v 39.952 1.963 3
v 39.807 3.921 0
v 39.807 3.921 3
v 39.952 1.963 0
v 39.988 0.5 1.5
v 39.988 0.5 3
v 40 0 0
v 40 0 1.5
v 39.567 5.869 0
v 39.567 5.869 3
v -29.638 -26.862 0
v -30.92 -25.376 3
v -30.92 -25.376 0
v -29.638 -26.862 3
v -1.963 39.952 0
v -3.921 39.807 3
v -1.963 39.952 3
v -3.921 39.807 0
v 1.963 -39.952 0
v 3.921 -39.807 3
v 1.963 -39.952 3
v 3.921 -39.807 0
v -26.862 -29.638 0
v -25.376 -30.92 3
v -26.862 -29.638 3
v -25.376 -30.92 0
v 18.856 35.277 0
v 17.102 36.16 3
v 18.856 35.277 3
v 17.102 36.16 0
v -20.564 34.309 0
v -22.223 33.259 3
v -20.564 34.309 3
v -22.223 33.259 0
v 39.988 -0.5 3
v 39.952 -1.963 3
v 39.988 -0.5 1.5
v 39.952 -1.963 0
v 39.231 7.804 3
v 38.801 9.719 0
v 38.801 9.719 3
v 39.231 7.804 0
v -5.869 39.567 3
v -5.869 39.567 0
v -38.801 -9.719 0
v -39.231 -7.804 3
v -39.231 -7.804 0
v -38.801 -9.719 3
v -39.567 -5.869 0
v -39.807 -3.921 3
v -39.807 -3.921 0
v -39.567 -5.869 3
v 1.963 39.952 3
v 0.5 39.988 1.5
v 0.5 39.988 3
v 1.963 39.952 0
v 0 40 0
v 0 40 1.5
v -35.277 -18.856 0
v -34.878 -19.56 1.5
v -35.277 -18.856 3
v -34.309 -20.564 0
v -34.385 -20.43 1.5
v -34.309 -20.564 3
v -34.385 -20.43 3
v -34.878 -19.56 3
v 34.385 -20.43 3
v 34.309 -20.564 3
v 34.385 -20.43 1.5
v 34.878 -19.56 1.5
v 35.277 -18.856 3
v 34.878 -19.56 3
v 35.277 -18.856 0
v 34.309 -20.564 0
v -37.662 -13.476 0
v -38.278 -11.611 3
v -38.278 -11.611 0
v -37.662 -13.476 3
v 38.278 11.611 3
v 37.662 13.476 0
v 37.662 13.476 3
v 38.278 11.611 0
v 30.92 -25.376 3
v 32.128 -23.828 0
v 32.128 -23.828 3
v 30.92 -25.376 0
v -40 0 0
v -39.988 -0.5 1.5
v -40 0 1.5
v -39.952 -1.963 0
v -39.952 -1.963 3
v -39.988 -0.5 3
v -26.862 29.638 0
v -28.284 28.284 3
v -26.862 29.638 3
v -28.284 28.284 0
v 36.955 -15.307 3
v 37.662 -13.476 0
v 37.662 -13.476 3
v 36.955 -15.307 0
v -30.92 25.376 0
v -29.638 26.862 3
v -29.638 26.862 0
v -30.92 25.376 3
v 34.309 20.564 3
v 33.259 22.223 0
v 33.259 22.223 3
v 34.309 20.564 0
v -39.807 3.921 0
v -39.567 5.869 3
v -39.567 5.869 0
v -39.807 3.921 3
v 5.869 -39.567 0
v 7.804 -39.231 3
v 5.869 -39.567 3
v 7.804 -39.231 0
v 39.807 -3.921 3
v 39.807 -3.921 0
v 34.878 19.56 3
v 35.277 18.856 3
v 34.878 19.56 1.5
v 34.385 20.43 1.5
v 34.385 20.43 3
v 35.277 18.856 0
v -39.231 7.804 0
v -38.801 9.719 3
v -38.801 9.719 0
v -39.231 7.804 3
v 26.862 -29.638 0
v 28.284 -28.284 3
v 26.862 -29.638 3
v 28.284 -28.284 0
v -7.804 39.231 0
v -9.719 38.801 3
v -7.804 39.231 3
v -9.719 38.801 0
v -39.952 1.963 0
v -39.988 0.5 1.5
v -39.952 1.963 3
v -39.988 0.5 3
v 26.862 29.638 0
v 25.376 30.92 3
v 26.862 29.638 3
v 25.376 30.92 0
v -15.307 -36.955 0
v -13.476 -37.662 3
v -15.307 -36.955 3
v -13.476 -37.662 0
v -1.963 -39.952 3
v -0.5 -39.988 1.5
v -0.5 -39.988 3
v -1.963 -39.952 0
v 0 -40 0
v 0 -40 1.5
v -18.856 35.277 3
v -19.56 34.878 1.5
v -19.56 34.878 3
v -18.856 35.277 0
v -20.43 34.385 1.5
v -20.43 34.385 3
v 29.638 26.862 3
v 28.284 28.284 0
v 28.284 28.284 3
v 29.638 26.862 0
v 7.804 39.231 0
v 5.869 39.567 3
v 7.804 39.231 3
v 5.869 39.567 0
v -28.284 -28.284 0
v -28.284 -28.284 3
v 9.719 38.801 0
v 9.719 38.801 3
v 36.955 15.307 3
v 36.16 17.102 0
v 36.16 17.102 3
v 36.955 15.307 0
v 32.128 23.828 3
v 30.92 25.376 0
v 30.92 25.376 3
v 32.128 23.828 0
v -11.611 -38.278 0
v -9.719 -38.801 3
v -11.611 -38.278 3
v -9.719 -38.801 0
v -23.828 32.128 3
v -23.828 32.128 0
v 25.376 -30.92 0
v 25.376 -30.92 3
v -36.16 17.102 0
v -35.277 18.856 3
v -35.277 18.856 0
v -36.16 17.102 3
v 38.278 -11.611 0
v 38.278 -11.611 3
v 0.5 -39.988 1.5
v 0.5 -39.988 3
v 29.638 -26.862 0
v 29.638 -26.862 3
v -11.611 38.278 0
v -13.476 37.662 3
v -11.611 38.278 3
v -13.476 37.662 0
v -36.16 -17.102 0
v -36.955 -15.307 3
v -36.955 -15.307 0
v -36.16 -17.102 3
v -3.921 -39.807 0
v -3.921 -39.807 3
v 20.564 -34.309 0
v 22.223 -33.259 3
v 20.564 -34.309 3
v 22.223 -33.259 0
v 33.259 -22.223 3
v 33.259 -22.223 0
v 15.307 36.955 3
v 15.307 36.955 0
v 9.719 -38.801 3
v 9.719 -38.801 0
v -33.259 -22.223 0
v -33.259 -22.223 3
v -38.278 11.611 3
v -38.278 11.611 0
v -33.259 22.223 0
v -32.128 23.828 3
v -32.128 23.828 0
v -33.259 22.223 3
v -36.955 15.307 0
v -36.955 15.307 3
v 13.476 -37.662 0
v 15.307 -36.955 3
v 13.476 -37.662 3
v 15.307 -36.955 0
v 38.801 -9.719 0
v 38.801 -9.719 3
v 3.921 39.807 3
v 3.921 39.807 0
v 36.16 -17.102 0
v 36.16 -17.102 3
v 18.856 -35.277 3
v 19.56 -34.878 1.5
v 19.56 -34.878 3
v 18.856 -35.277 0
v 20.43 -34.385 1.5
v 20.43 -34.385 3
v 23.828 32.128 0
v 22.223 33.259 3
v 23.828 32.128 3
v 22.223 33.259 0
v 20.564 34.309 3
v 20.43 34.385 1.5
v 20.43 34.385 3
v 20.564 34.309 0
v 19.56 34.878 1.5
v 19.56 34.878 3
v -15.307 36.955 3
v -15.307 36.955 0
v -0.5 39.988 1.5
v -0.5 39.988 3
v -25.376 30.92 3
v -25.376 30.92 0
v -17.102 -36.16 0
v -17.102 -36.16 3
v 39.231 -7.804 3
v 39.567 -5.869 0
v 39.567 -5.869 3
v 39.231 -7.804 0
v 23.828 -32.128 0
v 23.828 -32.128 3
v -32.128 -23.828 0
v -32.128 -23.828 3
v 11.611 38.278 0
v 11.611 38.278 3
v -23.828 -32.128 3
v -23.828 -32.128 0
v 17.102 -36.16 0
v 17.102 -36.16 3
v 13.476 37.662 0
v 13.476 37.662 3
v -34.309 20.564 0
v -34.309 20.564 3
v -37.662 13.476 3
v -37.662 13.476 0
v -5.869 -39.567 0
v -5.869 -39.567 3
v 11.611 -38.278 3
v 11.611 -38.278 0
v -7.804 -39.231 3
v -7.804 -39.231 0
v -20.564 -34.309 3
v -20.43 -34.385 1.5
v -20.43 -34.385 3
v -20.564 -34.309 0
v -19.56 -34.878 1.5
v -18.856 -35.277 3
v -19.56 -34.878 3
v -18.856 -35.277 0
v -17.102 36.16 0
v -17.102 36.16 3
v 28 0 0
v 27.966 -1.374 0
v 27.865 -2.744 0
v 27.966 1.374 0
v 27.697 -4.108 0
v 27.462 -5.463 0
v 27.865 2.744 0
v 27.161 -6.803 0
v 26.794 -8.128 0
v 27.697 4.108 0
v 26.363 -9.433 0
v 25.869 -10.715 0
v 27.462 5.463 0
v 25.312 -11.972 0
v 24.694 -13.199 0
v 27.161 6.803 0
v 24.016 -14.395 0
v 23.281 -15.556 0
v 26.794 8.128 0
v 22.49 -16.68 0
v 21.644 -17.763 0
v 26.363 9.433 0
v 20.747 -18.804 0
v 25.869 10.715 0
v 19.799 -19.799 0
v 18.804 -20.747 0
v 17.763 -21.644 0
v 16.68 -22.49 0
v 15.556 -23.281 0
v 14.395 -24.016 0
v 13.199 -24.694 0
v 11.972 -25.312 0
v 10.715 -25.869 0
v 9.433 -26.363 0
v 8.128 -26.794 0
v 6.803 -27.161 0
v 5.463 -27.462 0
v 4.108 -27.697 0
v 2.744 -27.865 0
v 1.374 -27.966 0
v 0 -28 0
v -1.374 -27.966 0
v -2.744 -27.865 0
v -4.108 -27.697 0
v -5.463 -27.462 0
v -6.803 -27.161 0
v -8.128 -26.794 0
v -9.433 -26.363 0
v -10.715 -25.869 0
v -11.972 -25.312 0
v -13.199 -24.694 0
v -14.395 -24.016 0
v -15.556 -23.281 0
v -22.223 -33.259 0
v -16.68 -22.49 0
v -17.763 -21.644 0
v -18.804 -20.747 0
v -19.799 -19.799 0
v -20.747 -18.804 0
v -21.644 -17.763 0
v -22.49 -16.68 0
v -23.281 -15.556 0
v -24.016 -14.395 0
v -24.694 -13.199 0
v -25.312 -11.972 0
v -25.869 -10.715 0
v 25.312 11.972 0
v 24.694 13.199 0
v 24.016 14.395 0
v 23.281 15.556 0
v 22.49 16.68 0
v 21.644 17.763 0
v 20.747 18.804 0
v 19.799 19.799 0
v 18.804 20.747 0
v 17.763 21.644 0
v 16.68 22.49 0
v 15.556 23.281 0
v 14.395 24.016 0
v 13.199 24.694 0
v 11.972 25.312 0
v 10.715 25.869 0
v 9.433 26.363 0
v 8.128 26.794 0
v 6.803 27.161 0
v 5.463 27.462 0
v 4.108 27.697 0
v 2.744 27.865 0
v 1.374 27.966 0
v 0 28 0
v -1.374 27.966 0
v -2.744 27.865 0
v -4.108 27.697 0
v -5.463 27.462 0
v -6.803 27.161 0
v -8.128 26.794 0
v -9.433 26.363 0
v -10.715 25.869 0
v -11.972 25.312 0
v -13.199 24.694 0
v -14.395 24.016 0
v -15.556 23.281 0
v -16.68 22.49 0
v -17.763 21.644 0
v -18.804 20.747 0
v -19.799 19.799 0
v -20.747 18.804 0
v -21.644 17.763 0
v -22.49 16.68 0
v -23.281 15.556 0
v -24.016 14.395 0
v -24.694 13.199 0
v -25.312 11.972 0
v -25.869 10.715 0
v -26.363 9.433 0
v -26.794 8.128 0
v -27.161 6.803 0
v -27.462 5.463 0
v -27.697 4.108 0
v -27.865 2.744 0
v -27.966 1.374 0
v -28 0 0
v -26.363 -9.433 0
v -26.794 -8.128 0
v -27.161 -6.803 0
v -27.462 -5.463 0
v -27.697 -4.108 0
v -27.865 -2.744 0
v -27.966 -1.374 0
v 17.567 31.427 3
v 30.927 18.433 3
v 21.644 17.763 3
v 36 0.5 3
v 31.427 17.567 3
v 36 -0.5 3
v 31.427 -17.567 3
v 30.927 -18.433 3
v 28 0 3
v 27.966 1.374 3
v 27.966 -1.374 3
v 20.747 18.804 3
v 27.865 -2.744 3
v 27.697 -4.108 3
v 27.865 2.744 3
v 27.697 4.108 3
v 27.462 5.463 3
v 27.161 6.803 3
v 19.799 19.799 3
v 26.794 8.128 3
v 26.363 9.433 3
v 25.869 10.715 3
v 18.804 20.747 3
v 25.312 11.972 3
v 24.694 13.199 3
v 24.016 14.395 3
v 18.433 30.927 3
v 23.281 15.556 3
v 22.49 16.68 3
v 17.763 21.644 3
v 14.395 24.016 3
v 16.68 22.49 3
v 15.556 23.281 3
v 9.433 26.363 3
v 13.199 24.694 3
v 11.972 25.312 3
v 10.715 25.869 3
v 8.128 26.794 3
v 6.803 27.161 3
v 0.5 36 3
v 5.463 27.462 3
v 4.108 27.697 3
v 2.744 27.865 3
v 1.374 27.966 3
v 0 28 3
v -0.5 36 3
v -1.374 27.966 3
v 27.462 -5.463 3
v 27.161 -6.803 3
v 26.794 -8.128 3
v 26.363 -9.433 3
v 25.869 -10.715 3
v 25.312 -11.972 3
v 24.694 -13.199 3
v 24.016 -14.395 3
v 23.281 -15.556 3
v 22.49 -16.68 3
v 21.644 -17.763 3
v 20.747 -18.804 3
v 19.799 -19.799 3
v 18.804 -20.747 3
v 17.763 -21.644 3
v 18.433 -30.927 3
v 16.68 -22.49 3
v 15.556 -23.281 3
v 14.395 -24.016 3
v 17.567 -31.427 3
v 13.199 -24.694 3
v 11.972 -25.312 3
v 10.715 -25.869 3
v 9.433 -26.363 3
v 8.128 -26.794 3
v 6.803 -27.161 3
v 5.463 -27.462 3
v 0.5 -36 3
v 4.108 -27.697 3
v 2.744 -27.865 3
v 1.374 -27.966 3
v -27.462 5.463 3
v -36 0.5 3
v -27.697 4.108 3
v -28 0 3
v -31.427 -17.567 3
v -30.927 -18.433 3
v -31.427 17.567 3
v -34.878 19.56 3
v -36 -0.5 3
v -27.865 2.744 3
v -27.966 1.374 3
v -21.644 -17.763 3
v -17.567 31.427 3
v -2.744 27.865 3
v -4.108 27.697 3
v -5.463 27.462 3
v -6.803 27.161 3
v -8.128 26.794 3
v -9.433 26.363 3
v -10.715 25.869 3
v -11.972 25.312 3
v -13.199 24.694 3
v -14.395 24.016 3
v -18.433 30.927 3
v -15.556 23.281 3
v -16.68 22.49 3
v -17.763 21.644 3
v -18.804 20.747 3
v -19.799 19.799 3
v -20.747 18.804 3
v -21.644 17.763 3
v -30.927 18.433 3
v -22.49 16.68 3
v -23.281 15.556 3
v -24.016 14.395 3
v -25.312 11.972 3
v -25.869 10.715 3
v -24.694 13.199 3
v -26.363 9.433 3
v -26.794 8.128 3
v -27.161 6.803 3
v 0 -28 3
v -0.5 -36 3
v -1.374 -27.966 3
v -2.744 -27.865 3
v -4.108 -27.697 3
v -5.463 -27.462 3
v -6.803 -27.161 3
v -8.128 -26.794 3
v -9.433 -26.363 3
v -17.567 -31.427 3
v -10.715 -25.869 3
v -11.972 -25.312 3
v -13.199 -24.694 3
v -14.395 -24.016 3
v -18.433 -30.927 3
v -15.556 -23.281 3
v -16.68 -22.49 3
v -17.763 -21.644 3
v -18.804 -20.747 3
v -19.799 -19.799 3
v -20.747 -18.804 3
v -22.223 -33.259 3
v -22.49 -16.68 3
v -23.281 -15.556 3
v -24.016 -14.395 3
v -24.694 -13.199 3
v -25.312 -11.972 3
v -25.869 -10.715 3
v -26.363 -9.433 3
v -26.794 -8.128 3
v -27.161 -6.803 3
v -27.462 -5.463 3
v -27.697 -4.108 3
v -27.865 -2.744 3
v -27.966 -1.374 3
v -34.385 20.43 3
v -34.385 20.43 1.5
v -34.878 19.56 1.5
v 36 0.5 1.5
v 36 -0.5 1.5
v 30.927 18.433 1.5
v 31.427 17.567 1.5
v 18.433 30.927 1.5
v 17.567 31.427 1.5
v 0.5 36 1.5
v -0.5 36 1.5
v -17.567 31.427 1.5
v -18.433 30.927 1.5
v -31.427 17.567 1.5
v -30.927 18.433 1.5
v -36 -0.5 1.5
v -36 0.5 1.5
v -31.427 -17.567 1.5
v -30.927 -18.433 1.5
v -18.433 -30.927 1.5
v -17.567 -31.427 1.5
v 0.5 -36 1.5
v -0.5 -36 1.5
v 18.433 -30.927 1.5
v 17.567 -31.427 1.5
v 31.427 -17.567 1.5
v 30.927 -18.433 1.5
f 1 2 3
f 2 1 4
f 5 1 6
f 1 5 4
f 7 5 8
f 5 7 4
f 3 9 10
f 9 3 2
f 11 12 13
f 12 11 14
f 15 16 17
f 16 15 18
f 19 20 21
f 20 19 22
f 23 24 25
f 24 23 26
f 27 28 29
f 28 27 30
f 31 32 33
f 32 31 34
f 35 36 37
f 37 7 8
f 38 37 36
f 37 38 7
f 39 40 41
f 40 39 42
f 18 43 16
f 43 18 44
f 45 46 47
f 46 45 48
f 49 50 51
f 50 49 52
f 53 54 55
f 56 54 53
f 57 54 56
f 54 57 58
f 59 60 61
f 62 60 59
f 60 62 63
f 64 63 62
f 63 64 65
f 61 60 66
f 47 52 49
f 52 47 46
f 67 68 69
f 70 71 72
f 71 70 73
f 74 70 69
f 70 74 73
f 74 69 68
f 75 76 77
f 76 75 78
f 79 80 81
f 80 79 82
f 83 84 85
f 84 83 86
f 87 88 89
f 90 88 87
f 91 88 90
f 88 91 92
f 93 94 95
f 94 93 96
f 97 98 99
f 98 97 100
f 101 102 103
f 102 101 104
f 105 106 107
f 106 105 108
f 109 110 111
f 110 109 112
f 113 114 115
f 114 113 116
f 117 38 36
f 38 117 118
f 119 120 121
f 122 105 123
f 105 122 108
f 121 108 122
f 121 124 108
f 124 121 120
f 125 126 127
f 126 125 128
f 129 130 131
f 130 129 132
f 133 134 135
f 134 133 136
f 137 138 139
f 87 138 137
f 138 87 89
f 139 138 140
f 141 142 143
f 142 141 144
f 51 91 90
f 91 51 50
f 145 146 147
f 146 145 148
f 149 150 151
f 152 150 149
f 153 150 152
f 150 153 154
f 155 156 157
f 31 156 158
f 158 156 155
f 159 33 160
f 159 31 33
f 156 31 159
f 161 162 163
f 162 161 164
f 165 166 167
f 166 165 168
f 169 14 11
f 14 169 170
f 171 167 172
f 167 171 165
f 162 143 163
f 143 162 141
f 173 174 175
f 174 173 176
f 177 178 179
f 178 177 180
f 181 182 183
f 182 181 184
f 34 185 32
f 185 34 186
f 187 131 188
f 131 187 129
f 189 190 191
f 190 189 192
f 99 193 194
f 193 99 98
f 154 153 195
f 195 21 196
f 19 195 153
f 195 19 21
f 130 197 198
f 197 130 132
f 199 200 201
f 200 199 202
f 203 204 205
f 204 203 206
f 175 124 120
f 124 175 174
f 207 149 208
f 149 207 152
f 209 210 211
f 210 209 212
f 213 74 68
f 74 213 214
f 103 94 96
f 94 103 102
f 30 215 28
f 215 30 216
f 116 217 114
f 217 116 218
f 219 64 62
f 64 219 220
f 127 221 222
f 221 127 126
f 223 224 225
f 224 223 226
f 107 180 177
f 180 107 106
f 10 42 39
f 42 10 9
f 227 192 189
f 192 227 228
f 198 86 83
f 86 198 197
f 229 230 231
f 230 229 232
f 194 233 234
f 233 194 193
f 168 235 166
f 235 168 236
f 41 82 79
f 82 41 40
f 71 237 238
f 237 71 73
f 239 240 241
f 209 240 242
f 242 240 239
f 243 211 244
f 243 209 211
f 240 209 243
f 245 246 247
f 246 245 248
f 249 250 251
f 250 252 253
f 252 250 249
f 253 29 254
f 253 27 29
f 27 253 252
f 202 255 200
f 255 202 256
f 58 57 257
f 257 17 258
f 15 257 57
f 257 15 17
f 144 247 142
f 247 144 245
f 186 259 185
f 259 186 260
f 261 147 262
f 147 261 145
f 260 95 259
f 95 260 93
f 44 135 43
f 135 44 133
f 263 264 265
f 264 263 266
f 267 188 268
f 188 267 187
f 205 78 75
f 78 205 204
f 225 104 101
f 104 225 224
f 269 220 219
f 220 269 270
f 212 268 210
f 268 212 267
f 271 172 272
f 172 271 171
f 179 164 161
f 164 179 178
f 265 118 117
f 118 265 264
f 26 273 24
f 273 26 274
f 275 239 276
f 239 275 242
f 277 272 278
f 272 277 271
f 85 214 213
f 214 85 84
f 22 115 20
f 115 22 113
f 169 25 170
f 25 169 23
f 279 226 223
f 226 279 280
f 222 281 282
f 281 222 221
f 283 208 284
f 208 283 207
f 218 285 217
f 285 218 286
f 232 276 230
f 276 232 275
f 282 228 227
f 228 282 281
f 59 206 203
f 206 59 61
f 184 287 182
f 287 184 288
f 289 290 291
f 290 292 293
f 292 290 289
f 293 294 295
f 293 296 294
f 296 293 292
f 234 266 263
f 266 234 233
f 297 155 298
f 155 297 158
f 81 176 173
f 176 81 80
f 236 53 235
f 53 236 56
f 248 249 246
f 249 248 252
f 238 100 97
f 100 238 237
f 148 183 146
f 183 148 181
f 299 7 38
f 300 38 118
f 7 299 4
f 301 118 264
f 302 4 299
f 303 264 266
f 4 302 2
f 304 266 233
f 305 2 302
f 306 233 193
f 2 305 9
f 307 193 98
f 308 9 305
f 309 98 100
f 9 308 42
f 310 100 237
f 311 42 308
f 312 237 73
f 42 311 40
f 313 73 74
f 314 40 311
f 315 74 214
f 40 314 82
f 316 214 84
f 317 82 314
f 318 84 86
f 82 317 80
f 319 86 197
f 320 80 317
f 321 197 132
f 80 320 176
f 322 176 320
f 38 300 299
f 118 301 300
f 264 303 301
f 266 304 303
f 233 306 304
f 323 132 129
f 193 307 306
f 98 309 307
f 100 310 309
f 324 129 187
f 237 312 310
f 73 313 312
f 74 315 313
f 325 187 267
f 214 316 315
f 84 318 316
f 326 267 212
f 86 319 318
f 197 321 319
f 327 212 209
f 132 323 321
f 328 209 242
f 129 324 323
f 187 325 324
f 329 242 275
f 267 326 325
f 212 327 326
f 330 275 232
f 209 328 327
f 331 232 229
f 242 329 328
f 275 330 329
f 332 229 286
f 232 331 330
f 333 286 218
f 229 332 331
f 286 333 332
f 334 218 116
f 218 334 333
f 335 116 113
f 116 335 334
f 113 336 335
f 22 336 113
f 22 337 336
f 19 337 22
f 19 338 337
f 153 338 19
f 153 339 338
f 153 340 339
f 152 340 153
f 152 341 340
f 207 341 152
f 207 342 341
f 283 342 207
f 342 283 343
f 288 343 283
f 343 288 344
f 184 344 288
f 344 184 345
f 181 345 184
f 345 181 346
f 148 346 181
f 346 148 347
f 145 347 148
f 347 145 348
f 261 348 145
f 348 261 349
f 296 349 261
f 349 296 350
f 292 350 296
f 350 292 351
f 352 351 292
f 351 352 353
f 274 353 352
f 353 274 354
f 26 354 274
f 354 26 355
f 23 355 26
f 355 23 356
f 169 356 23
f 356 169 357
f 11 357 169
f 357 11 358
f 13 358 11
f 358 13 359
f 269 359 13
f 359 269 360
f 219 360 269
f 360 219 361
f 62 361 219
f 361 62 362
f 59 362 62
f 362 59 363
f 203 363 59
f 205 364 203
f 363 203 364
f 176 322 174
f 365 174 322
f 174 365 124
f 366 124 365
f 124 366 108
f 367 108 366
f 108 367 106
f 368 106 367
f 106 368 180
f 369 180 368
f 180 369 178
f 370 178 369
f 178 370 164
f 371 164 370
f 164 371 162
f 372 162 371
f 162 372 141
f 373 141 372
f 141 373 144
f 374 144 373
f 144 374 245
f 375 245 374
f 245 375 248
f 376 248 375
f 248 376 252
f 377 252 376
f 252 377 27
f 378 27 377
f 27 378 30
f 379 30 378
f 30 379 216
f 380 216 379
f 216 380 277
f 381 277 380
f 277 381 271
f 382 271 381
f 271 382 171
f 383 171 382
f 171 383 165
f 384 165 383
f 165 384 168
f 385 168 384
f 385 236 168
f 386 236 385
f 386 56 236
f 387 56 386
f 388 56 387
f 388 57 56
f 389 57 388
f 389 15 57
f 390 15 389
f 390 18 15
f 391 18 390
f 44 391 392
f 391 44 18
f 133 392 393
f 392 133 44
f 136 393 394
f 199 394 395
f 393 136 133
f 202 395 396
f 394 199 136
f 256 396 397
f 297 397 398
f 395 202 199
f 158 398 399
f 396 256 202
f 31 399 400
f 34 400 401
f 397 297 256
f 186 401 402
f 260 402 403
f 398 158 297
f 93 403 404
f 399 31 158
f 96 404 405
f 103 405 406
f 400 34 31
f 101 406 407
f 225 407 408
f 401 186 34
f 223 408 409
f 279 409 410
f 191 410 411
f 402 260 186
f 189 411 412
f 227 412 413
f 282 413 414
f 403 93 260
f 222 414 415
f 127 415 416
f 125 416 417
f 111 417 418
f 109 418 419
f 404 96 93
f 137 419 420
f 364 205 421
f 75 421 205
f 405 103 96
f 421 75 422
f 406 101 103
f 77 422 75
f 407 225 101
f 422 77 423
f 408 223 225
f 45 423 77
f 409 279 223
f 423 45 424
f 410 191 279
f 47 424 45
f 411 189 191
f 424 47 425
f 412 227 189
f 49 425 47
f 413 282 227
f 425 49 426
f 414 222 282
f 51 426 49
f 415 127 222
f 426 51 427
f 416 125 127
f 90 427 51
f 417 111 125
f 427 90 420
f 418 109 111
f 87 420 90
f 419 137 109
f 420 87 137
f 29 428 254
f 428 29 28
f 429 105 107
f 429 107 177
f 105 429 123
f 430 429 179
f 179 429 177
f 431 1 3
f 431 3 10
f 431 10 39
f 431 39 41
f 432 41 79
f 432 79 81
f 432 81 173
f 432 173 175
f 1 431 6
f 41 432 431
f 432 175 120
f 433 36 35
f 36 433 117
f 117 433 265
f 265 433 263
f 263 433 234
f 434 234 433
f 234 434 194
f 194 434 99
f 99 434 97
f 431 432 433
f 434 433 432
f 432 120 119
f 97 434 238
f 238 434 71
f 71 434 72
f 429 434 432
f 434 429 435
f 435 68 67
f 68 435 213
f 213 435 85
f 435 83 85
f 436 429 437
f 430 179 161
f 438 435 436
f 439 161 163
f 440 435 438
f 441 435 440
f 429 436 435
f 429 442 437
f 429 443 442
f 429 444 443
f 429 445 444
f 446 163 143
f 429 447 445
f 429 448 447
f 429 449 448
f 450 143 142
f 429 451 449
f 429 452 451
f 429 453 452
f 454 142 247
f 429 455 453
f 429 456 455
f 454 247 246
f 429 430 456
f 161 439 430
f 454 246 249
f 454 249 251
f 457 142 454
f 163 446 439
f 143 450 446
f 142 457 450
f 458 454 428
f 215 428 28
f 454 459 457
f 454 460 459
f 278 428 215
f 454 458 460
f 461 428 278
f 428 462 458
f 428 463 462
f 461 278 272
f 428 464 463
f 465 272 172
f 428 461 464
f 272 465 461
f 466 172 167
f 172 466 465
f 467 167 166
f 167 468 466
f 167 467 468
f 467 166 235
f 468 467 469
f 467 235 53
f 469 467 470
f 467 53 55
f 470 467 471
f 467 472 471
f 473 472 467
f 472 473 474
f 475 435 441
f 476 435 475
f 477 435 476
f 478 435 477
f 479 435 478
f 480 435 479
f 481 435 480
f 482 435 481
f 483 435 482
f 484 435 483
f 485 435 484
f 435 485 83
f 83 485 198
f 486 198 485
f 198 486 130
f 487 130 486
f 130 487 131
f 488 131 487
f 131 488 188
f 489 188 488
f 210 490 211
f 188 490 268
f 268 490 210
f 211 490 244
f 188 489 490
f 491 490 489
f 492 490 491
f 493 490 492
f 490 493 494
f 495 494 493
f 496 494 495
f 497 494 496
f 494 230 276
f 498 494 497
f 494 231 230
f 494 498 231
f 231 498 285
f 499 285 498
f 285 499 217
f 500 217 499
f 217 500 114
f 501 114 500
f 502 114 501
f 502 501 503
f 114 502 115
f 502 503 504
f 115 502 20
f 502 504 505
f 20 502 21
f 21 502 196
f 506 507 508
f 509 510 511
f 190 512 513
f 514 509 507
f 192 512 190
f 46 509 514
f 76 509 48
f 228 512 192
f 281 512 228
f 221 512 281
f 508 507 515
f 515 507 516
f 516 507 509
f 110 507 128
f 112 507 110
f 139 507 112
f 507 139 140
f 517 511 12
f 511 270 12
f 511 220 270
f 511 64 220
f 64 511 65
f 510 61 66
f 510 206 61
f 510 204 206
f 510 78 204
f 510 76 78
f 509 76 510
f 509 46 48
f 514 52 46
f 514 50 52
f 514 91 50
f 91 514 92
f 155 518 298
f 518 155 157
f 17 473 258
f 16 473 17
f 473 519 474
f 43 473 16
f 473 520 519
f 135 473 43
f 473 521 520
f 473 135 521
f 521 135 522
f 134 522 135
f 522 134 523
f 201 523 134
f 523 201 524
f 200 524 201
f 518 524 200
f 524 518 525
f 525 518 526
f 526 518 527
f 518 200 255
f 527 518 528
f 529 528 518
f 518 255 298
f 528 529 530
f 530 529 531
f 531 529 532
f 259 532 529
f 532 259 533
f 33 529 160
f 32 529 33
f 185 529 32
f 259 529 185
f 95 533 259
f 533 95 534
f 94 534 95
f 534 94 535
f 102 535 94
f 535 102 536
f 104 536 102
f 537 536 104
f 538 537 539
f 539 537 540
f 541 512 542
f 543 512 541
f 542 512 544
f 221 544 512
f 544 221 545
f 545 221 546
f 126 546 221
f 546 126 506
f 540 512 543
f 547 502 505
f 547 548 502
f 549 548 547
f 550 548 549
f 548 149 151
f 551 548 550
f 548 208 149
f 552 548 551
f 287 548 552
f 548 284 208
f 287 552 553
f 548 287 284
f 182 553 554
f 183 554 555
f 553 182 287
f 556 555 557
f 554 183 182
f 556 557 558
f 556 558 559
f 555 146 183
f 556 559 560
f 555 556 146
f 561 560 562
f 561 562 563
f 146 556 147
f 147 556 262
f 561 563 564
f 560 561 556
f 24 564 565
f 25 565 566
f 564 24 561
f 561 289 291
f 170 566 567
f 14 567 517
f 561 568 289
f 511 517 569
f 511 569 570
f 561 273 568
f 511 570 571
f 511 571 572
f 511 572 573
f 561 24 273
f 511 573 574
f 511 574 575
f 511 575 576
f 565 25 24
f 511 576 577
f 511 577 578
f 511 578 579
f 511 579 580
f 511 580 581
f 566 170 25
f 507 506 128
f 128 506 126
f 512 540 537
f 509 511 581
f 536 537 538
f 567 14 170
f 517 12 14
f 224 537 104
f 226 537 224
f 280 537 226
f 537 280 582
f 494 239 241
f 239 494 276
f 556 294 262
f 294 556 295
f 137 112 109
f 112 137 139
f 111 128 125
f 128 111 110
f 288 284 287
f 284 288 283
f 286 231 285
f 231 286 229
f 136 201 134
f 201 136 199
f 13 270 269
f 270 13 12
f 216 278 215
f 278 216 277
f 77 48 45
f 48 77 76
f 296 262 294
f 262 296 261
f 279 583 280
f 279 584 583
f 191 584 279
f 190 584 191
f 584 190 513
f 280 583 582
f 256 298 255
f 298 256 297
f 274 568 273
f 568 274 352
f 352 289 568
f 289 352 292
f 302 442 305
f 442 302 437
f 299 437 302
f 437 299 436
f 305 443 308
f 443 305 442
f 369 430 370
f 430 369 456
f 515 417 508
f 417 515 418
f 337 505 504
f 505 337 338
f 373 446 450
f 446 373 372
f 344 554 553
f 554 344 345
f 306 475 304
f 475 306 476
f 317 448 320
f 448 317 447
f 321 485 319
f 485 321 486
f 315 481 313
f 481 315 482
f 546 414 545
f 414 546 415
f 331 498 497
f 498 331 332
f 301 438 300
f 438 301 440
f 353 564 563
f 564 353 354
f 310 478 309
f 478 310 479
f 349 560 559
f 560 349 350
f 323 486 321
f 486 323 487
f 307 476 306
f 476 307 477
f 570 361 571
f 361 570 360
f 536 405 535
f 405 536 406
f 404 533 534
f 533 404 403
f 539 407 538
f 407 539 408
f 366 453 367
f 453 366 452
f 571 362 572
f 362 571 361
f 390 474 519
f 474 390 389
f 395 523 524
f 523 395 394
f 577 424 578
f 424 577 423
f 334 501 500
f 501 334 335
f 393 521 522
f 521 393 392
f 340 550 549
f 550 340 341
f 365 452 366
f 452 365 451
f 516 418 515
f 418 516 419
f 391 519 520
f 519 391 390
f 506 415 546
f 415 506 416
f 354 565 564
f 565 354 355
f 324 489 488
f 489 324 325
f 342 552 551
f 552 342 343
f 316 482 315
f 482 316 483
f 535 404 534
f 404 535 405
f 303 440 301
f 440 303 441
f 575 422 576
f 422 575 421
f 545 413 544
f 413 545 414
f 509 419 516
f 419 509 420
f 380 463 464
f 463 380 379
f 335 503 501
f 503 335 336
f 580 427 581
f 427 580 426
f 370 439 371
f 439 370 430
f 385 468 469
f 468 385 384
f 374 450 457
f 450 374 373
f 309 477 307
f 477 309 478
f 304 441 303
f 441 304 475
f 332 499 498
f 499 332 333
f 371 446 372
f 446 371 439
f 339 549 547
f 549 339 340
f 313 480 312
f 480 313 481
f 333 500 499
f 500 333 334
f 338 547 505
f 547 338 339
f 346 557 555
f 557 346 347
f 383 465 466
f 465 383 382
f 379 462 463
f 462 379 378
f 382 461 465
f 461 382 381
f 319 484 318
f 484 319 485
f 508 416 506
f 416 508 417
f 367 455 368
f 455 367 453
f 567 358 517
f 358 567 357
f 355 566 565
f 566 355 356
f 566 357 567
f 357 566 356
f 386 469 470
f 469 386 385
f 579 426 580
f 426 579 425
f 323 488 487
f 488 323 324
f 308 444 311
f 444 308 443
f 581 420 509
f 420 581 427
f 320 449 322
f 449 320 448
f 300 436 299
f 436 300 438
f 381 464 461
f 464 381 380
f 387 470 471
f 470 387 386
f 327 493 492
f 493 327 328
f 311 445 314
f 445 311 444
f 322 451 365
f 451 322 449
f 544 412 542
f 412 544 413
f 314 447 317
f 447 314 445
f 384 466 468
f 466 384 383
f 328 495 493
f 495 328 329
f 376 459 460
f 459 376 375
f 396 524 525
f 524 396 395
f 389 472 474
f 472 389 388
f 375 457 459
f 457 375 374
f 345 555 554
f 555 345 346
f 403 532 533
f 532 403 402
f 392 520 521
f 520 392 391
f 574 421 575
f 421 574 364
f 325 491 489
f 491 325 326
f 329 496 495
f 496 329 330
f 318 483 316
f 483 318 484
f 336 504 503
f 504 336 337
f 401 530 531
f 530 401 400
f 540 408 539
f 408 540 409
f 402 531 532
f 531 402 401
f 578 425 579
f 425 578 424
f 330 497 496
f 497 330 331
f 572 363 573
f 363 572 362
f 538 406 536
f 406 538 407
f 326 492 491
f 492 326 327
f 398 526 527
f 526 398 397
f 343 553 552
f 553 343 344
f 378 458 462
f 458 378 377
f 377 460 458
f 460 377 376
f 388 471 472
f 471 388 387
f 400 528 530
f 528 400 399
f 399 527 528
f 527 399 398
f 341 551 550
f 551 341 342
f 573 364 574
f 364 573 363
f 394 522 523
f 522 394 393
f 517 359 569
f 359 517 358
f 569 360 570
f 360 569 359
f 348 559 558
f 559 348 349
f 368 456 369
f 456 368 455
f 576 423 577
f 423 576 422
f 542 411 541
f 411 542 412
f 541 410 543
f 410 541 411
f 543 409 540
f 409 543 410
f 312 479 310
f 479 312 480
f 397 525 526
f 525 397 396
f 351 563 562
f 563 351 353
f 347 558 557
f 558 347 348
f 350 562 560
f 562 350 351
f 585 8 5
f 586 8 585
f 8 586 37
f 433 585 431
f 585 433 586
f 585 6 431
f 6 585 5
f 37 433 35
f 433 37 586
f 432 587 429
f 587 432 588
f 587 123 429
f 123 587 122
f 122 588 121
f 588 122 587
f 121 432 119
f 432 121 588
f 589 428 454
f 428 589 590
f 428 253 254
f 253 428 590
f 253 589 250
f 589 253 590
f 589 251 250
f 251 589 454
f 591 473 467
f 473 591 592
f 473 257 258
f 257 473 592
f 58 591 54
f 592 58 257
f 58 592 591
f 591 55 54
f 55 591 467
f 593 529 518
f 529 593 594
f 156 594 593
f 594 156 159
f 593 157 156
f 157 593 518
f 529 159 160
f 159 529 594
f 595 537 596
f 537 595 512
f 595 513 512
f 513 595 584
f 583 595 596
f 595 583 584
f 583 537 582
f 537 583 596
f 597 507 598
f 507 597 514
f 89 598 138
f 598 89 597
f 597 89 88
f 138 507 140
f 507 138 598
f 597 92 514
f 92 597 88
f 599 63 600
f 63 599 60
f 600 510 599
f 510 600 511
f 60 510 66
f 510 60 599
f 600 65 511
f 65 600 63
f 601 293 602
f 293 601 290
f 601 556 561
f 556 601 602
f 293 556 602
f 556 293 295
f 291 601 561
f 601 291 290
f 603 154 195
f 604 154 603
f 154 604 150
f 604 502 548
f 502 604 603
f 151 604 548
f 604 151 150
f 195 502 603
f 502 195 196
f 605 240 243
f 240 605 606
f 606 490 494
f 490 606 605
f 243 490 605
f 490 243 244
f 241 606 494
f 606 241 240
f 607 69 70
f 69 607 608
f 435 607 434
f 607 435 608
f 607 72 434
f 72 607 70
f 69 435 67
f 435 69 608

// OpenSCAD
// Flat dial ring with radial tick marks for a rotary stage
// Units: mm. Print orientation: flat on bed, top face up.

$fn = 128;

// --- Ring dimensions ---
outer_d     = 80;    // outer diameter
inner_d     = 56;    // inner diameter (bore)
thickness   = 3;     // ring thickness (Z)

// --- Tick mark dimensions ---
tick_count  = 12;    // number of evenly spaced ticks
tick_width  = 1;     // groove width (tangential)
tick_depth  = 1.5;   // groove depth from top face
tick_length = 4;     // radial length inward from outer edge
tick_start_angle = 0; // first tick on +X axis

// --- Cutting overlap ---
eps = 0.5;           // extension past cut faces

outer_r = outer_d / 2;
inner_r = inner_d / 2;

difference() {
    // Annulus body
    difference() {
        cylinder(d = outer_d, h = thickness);
        translate([0, 0, -eps])
            cylinder(d = inner_d, h = thickness + 2 * eps);
    }

    // Radial tick grooves in top face
    for (i = [0 : tick_count - 1]) {
        rotate([0, 0, tick_start_angle + i * 360 / tick_count])
            translate([outer_r - tick_length,
                       -tick_width / 2,
                       thickness - tick_depth])
                cube([tick_length + eps, tick_width, tick_depth + eps]);
    }
}
